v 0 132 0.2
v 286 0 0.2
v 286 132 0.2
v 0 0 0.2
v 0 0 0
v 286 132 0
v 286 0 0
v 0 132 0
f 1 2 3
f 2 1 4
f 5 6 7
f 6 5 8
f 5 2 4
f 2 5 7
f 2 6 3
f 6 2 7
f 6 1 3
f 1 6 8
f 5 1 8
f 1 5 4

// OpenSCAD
$fa=4; $fs=0.4;
color("#000000") translate([0.000,0.000,0.000]) cube([286.000,132.000,0.200]);
